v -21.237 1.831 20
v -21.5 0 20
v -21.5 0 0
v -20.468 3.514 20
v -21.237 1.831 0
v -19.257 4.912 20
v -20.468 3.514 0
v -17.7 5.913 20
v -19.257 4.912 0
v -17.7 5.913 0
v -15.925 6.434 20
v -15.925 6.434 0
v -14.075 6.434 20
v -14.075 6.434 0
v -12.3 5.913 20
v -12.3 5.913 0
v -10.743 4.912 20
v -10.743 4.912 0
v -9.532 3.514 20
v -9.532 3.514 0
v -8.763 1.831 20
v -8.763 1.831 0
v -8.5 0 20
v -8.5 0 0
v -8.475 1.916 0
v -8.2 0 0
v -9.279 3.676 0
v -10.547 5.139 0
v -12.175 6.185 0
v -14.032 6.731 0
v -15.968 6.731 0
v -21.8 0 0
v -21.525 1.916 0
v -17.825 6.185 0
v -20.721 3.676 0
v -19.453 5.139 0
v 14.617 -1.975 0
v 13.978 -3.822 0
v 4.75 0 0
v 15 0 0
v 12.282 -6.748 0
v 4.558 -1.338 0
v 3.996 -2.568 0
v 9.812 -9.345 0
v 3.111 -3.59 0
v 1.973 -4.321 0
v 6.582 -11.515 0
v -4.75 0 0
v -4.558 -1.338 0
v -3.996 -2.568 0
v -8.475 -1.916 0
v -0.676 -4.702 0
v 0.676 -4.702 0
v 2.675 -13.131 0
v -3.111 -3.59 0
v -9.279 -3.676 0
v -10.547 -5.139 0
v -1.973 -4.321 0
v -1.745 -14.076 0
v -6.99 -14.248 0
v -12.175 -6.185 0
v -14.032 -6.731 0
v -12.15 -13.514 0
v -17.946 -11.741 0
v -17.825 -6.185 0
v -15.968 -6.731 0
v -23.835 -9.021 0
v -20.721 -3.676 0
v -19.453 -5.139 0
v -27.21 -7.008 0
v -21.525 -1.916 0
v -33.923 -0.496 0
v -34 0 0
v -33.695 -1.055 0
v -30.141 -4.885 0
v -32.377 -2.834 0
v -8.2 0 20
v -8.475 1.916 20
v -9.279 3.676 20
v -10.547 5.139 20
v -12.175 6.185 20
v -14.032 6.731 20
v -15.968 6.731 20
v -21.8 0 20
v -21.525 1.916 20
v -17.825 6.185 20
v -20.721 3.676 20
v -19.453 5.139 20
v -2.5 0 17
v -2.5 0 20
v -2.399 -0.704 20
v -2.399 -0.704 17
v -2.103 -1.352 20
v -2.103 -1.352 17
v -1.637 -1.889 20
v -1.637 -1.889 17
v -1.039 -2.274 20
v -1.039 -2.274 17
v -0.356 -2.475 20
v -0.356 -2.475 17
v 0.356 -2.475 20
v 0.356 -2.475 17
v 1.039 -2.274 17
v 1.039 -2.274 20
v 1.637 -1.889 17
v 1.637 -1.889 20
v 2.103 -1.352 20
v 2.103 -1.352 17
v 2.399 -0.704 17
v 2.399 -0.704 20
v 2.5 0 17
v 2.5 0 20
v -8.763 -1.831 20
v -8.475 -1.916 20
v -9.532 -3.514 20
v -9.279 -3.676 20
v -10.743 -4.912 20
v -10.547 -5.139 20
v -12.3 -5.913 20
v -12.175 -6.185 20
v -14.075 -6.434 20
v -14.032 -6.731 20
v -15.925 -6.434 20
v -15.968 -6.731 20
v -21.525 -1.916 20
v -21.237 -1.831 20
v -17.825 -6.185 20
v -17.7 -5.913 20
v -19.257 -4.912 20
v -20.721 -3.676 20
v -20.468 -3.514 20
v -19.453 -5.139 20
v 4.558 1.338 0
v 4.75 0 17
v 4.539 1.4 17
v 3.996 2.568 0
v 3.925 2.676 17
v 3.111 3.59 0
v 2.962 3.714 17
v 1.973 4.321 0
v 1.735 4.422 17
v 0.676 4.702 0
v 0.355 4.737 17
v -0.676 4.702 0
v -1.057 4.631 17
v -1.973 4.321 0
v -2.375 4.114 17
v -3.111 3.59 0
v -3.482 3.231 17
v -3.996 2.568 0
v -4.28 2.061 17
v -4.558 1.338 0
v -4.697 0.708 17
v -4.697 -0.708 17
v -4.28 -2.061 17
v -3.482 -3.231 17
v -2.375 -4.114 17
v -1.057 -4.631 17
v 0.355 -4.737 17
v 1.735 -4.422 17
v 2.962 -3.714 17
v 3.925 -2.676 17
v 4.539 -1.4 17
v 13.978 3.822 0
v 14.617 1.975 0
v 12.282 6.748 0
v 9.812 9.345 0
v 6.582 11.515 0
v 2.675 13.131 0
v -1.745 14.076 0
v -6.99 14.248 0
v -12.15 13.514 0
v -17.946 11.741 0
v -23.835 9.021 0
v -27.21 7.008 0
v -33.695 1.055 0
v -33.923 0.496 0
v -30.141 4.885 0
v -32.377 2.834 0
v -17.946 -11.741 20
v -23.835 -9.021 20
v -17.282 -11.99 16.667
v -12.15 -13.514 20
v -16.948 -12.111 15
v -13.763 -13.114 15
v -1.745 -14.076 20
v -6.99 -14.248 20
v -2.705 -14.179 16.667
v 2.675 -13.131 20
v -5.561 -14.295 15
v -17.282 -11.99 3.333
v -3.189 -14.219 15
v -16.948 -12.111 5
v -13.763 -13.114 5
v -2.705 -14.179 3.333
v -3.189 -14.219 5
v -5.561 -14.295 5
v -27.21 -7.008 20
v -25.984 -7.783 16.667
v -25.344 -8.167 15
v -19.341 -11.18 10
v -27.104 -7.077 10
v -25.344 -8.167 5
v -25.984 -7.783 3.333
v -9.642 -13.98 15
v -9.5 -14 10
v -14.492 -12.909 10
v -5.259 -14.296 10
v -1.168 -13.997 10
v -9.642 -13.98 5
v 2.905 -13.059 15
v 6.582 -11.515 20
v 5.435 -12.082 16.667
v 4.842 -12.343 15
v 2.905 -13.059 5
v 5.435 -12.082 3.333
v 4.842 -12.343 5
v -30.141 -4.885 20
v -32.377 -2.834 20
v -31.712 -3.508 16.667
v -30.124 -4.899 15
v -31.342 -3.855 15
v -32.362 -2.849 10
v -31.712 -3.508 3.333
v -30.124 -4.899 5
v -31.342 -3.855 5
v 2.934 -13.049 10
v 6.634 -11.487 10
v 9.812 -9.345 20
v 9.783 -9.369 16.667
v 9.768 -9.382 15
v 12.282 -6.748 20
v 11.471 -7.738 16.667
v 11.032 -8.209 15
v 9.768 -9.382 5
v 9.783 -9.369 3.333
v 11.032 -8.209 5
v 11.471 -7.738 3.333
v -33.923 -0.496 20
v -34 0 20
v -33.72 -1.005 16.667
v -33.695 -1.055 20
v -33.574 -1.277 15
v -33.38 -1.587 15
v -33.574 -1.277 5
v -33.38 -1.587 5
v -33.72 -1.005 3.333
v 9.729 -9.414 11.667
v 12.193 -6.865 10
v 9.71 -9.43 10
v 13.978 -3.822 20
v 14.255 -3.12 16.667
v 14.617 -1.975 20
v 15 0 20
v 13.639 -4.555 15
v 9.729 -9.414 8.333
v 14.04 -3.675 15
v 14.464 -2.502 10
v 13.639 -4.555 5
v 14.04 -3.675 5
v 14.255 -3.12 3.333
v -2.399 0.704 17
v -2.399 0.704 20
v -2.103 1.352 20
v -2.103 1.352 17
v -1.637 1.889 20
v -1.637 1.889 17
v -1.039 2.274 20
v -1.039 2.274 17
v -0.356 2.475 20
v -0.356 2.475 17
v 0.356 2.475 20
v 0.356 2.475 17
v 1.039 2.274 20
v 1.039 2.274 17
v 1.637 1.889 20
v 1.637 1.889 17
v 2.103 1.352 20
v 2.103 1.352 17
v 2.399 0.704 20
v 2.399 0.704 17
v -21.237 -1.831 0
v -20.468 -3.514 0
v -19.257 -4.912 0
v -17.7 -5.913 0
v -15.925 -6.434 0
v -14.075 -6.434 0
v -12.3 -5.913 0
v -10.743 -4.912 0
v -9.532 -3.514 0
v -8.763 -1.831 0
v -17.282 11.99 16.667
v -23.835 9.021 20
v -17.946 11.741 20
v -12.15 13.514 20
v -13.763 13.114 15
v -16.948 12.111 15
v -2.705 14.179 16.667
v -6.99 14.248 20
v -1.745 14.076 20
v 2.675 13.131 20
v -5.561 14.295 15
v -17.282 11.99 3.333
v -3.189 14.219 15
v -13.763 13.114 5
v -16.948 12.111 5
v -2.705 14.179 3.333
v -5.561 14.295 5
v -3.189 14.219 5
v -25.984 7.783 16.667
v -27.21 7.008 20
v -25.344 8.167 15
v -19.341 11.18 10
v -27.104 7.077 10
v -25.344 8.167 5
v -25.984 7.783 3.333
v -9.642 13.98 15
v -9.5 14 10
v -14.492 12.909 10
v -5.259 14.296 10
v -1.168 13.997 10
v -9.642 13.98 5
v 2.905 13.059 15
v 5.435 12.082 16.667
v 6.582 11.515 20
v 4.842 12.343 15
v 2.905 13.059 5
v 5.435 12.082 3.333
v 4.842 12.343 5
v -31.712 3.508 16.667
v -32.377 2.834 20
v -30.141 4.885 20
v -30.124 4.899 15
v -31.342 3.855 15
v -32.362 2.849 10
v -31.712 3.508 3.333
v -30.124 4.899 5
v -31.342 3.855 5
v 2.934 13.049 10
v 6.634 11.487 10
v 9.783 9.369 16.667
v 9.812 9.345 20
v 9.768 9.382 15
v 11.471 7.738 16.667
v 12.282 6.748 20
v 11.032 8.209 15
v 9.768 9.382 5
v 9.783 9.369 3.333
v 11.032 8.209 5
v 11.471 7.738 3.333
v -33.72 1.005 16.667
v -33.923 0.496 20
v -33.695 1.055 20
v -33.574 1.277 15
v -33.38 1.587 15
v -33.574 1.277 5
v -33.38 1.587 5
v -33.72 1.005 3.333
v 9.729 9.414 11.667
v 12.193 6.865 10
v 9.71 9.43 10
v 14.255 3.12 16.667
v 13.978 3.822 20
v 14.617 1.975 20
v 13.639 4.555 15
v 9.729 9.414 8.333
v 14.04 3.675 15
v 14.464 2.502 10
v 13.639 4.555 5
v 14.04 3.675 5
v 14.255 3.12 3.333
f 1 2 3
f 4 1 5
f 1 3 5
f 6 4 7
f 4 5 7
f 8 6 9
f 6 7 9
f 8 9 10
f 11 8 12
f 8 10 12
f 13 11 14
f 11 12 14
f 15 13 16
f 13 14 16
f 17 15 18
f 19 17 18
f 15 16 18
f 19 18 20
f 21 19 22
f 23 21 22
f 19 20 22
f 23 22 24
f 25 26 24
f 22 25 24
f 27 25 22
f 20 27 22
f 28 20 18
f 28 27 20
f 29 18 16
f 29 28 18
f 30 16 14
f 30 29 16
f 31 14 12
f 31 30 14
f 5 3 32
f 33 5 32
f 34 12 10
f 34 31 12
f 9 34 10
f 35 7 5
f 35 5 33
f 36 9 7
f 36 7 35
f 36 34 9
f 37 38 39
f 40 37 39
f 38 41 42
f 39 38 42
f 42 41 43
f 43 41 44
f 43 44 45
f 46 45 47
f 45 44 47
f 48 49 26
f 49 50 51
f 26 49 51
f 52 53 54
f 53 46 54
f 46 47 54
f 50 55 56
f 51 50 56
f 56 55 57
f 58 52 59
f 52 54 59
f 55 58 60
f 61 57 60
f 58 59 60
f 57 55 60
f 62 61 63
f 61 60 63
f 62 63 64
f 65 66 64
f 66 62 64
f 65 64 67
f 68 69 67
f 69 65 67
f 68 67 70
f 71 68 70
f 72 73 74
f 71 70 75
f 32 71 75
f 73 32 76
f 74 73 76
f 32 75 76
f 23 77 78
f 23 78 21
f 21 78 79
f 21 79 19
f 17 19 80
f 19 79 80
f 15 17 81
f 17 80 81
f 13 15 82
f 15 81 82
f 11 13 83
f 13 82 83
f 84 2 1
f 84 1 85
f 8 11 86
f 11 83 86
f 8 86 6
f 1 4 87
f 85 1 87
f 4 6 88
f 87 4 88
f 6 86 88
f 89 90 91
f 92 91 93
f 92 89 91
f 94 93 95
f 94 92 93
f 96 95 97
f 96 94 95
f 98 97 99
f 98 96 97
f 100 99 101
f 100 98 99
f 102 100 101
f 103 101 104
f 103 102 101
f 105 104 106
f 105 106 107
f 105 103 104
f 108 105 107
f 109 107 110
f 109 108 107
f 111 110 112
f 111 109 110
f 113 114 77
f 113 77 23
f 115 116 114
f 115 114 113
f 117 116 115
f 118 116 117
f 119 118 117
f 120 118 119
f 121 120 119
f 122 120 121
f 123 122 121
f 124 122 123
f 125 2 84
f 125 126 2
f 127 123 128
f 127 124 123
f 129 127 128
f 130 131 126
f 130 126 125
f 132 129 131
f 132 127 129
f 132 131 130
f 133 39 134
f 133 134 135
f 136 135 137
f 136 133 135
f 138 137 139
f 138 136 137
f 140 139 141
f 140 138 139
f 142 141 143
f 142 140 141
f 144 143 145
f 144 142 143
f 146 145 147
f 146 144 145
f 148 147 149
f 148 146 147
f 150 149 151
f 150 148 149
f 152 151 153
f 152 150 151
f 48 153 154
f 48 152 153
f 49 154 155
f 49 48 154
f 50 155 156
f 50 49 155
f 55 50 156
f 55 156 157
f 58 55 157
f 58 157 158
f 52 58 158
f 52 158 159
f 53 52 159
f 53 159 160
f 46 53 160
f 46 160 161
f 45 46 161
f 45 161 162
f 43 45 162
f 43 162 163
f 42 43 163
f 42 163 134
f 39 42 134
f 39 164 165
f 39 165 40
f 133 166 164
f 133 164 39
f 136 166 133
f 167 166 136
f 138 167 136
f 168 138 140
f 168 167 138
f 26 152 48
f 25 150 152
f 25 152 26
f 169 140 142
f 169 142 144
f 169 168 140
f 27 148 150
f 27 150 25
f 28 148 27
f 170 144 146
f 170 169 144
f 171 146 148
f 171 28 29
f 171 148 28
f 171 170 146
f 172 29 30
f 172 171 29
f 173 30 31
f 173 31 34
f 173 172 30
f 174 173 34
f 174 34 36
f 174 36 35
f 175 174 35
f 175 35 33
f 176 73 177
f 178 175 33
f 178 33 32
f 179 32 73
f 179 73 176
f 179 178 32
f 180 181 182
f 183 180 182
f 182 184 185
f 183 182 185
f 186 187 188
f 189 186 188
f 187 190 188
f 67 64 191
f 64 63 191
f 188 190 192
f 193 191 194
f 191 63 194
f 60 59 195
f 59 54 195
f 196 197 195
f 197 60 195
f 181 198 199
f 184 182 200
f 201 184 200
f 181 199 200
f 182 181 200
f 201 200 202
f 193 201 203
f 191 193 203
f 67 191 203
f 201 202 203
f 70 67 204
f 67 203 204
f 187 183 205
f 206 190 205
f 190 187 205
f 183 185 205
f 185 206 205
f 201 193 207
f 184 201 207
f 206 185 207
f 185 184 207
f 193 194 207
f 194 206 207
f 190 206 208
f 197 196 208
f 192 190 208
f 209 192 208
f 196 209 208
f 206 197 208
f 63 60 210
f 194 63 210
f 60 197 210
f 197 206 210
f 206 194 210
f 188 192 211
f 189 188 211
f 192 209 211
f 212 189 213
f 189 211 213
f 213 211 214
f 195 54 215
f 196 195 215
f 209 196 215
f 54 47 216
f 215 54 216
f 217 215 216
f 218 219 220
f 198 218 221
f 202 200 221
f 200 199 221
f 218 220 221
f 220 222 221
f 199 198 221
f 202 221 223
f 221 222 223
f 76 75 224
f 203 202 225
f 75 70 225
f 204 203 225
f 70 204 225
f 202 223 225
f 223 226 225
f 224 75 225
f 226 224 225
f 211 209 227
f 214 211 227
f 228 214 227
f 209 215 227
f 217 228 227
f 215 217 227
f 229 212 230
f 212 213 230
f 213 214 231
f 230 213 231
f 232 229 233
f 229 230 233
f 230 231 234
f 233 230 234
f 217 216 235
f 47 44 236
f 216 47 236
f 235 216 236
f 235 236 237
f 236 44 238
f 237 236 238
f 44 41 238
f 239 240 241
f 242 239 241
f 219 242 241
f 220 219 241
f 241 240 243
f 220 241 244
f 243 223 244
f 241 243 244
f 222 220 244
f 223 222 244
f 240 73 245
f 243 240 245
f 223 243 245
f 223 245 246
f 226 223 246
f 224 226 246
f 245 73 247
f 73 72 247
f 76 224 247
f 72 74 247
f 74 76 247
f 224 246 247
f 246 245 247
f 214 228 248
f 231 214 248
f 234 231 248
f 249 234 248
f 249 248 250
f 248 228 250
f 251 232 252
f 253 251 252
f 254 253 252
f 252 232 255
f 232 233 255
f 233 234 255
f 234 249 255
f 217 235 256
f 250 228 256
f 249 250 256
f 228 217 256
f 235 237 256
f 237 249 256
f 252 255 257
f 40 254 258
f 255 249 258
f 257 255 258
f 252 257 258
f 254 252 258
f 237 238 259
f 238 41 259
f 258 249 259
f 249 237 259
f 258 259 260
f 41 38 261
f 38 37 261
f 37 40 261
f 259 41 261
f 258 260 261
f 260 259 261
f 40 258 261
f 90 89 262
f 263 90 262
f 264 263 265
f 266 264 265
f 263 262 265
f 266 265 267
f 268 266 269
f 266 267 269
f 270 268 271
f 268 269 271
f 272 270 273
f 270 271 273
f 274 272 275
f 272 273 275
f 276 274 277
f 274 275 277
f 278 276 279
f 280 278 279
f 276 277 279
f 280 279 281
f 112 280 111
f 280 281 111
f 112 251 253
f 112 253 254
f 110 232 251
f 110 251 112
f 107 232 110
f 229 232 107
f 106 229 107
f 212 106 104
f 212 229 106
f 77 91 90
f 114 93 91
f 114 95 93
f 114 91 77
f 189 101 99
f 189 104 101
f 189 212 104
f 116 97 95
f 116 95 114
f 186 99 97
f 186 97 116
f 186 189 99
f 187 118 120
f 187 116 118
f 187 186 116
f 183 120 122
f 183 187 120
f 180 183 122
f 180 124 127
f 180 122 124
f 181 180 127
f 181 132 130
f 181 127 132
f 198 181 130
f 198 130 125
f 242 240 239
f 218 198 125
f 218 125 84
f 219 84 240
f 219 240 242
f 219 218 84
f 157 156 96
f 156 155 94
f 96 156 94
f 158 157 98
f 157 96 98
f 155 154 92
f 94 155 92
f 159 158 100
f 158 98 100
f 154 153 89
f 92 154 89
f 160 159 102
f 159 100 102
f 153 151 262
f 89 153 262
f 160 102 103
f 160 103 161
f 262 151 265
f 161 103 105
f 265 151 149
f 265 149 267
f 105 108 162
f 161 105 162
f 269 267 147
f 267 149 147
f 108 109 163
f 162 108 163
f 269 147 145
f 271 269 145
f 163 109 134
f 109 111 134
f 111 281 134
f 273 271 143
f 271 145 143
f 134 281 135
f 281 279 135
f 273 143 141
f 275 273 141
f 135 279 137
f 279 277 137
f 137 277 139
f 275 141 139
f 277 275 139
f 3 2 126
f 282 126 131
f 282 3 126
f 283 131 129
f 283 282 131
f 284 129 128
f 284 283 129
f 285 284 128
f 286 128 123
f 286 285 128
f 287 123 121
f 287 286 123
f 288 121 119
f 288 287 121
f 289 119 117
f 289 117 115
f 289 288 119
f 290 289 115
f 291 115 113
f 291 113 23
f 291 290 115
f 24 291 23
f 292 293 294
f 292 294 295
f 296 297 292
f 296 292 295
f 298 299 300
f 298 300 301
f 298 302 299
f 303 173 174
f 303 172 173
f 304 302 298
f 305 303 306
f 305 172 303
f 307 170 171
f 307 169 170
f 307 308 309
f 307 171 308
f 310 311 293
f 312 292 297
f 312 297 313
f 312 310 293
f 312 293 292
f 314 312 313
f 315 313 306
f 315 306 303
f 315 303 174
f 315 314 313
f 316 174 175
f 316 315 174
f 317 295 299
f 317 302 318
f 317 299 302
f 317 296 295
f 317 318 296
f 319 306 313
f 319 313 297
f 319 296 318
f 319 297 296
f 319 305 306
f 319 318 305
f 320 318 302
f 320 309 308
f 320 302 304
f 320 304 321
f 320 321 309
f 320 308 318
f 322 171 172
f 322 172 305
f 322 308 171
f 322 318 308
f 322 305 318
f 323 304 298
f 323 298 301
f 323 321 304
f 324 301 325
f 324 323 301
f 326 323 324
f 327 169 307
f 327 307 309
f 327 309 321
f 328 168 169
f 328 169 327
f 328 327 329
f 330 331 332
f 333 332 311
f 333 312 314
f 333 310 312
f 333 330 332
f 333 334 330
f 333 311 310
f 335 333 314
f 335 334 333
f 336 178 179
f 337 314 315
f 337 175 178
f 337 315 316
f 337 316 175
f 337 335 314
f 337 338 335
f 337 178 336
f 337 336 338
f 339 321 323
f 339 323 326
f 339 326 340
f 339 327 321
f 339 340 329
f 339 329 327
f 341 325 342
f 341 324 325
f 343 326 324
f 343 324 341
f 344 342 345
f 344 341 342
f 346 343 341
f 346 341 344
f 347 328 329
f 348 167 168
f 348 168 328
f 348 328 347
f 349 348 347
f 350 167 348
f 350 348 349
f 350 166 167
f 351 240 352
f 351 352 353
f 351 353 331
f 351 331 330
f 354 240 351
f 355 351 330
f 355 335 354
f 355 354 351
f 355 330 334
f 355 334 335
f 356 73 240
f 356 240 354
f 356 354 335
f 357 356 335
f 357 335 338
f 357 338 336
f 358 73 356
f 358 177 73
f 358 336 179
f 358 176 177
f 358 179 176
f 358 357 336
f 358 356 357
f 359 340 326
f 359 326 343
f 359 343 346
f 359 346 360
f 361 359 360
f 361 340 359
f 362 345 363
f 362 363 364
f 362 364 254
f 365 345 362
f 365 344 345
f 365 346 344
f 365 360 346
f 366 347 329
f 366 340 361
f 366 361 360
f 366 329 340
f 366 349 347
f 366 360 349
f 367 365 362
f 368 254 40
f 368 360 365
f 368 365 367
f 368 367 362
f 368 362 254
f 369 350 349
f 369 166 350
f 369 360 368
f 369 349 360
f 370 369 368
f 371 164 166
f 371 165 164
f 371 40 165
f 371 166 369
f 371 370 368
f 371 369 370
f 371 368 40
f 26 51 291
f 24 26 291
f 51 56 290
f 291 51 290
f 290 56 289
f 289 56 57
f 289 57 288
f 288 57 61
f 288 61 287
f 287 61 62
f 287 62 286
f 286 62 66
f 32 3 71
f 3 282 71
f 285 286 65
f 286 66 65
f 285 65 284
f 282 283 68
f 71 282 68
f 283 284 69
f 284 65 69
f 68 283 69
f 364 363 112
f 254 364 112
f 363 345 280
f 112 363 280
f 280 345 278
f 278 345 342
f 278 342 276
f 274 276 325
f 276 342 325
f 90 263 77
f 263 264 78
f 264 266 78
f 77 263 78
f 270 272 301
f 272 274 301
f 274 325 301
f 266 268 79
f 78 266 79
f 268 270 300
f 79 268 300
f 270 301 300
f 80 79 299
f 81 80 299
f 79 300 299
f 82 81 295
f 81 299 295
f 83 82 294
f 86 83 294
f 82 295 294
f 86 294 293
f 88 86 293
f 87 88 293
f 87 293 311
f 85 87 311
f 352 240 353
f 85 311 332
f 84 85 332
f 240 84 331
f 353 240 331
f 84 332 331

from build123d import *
from build123d import SkipClean  # not in build123d's __all__

# Parameters (mm, degrees)
F1_DEPTH = 20
F3_R     = 6.8
F3_R_2   = 6.5
F4_DEPTH = 20
F5_R     = 4.75
F6_DEPTH = 17


with BuildPart() as f1:
    # F0 (on Top) → F1 (new body)
    with BuildSketch(Plane.XY):
        with BuildLine():
            add(Edge.make_bspline(
                [(-34, 0), (-34.0019650757, 3.3683322836), (-8.8829017766, 21.2695751777), (13.7677686289, 10.092517361), (15, 0)],
                knots=[0, 0, 0, 0, 0.5, 1, 1, 1, 1], degree=3))
            Line((-34, 0), (-21.5, 0))
            ThreePointArc((-21.5, 0), (-15, 6.5), (-8.5, 0))
            Line((-8.5, 0), (-2.5, 0))
            ThreePointArc((-2.5, 0), (0, 2.5), (2.5, 0))
            Line((2.5, 0), (15, 0))
        make_face()
    extrude(amount=F1_DEPTH)

    # F2: F1 across plane


with BuildPart() as f1_1:
    add(f1.part, clean=False)
    with SkipClean():  # cleaning this boolean's faces spoils the solid; the shape is the same uncleaned
        add(f1.part.mirror(Plane.XZ), clean=False)

    # F3 (on Top) → F4 (join)
    with BuildSketch(Plane.XY):
        with Locations((-15, 0)):
            Circle(F3_R)
        with Locations((-15, 0)):
            Circle(F3_R_2, mode=Mode.SUBTRACT)
    with SkipClean():  # cleaning this boolean's faces spoils the solid; the shape is the same uncleaned
        extrude(amount=F4_DEPTH)


with BuildPart() as f6:
    # F5 (on Top) → F6 (new body)
    with BuildSketch(Plane.XY):
        Circle(F5_R)
    extrude(amount=F6_DEPTH)


with BuildPart() as f1_2:
    add(f1_1.part, clean=False)

    # F7: cut F6
    add(f6.part, mode=Mode.SUBTRACT)


solid = f1_2.part
